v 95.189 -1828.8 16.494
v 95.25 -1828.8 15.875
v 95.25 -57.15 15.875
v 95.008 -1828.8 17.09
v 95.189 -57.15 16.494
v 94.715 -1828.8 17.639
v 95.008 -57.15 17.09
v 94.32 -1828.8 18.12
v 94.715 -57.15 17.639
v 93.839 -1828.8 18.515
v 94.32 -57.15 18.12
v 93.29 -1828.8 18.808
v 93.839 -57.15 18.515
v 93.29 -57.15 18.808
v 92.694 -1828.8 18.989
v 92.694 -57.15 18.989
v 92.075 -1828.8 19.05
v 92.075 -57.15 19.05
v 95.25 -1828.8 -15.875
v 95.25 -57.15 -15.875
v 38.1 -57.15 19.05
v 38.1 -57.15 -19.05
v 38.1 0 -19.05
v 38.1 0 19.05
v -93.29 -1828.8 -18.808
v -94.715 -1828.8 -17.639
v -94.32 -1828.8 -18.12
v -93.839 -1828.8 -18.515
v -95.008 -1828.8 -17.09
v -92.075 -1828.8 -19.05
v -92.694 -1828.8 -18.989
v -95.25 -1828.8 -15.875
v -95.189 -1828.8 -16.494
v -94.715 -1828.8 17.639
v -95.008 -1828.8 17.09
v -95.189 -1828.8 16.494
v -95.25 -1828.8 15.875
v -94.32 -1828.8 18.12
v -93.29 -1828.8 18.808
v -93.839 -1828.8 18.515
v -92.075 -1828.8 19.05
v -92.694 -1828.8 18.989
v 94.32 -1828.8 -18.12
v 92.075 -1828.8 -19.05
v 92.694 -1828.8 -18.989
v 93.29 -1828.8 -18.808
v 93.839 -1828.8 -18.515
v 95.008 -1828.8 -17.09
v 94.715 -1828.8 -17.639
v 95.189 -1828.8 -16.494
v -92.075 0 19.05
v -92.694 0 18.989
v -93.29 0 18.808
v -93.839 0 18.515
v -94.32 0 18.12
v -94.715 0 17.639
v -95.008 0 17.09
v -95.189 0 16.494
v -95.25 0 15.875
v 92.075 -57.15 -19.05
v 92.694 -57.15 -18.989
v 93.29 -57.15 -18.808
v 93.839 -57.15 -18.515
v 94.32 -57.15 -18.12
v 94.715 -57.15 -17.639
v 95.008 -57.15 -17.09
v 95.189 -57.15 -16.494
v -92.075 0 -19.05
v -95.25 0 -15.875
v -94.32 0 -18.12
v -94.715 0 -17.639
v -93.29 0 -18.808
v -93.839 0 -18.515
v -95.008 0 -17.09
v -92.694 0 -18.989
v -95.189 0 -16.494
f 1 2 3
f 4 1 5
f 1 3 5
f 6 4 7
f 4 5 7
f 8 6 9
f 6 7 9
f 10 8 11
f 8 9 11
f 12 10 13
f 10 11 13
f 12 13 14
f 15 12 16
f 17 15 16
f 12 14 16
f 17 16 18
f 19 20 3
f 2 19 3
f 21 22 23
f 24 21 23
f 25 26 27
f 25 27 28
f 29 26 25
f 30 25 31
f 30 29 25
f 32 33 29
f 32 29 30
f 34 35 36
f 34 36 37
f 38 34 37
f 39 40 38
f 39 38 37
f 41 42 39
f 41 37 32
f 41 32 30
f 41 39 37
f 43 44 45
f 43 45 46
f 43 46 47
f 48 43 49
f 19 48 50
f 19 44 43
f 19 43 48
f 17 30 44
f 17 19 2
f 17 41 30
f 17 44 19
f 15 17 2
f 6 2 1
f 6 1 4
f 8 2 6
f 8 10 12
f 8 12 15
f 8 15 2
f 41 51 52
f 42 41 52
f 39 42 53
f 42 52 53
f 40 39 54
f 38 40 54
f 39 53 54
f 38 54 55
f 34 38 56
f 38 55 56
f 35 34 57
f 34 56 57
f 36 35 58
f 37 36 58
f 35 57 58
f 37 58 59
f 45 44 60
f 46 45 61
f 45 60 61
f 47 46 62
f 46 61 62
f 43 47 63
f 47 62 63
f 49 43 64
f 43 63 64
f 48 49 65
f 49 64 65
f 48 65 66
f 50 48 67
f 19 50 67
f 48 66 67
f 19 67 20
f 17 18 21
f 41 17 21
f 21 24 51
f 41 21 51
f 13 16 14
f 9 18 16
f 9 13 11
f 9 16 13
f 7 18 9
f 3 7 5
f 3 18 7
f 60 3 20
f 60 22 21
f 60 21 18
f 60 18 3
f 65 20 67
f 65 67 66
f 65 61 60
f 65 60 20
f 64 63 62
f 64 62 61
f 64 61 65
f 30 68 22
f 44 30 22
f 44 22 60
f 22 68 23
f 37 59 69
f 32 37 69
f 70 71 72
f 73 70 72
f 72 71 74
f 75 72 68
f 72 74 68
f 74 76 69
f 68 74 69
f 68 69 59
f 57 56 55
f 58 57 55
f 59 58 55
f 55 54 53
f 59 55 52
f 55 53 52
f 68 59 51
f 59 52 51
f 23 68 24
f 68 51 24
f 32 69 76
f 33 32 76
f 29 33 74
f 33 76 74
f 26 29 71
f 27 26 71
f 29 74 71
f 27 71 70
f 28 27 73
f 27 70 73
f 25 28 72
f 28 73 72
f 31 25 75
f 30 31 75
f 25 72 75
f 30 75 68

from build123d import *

# Parameters (mm, degrees)
F1_DEPTH      = 1828.8
F2_W          = 57.15
F2_H          = 57.15
F3_DEPTH      = 19.051
F3_DEPTH_BACK = 19.051


with BuildPart() as f1:
    # F0 (on Front) → F1 (new body)
    with BuildSketch(Plane.XZ):
        with BuildLine():
            ThreePointArc((95.25, 15.875), (94.320064, 18.120064), (92.075, 19.05))
            Line((92.075, 19.05), (-92.075, 19.05))
            ThreePointArc((-92.075, 19.05), (-94.320064, 18.120064), (-95.25, 15.875))
            Line((-95.25, 15.875), (-95.25, -15.875))
            ThreePointArc((-95.25, -15.875), (-94.320064, -18.120064), (-92.075, -19.05))
            Line((-92.075, -19.05), (92.075, -19.05))
            ThreePointArc((92.075, -19.05), (94.320064, -18.120064), (95.25, -15.875))
            Line((95.25, -15.875), (95.25, 15.875))
        make_face()
    extrude(amount=F1_DEPTH)

    # F2 (on Top) → F3 (cut, two sides)
    with BuildSketch(Plane.XY) as f3_sk:
        with Locations((66.675, -28.575)):
            Rectangle(F2_W, F2_H)
    extrude(amount=F3_DEPTH, mode=Mode.SUBTRACT)
    extrude(f3_sk.sketch, amount=-F3_DEPTH_BACK, mode=Mode.SUBTRACT)


solid = f1.part
